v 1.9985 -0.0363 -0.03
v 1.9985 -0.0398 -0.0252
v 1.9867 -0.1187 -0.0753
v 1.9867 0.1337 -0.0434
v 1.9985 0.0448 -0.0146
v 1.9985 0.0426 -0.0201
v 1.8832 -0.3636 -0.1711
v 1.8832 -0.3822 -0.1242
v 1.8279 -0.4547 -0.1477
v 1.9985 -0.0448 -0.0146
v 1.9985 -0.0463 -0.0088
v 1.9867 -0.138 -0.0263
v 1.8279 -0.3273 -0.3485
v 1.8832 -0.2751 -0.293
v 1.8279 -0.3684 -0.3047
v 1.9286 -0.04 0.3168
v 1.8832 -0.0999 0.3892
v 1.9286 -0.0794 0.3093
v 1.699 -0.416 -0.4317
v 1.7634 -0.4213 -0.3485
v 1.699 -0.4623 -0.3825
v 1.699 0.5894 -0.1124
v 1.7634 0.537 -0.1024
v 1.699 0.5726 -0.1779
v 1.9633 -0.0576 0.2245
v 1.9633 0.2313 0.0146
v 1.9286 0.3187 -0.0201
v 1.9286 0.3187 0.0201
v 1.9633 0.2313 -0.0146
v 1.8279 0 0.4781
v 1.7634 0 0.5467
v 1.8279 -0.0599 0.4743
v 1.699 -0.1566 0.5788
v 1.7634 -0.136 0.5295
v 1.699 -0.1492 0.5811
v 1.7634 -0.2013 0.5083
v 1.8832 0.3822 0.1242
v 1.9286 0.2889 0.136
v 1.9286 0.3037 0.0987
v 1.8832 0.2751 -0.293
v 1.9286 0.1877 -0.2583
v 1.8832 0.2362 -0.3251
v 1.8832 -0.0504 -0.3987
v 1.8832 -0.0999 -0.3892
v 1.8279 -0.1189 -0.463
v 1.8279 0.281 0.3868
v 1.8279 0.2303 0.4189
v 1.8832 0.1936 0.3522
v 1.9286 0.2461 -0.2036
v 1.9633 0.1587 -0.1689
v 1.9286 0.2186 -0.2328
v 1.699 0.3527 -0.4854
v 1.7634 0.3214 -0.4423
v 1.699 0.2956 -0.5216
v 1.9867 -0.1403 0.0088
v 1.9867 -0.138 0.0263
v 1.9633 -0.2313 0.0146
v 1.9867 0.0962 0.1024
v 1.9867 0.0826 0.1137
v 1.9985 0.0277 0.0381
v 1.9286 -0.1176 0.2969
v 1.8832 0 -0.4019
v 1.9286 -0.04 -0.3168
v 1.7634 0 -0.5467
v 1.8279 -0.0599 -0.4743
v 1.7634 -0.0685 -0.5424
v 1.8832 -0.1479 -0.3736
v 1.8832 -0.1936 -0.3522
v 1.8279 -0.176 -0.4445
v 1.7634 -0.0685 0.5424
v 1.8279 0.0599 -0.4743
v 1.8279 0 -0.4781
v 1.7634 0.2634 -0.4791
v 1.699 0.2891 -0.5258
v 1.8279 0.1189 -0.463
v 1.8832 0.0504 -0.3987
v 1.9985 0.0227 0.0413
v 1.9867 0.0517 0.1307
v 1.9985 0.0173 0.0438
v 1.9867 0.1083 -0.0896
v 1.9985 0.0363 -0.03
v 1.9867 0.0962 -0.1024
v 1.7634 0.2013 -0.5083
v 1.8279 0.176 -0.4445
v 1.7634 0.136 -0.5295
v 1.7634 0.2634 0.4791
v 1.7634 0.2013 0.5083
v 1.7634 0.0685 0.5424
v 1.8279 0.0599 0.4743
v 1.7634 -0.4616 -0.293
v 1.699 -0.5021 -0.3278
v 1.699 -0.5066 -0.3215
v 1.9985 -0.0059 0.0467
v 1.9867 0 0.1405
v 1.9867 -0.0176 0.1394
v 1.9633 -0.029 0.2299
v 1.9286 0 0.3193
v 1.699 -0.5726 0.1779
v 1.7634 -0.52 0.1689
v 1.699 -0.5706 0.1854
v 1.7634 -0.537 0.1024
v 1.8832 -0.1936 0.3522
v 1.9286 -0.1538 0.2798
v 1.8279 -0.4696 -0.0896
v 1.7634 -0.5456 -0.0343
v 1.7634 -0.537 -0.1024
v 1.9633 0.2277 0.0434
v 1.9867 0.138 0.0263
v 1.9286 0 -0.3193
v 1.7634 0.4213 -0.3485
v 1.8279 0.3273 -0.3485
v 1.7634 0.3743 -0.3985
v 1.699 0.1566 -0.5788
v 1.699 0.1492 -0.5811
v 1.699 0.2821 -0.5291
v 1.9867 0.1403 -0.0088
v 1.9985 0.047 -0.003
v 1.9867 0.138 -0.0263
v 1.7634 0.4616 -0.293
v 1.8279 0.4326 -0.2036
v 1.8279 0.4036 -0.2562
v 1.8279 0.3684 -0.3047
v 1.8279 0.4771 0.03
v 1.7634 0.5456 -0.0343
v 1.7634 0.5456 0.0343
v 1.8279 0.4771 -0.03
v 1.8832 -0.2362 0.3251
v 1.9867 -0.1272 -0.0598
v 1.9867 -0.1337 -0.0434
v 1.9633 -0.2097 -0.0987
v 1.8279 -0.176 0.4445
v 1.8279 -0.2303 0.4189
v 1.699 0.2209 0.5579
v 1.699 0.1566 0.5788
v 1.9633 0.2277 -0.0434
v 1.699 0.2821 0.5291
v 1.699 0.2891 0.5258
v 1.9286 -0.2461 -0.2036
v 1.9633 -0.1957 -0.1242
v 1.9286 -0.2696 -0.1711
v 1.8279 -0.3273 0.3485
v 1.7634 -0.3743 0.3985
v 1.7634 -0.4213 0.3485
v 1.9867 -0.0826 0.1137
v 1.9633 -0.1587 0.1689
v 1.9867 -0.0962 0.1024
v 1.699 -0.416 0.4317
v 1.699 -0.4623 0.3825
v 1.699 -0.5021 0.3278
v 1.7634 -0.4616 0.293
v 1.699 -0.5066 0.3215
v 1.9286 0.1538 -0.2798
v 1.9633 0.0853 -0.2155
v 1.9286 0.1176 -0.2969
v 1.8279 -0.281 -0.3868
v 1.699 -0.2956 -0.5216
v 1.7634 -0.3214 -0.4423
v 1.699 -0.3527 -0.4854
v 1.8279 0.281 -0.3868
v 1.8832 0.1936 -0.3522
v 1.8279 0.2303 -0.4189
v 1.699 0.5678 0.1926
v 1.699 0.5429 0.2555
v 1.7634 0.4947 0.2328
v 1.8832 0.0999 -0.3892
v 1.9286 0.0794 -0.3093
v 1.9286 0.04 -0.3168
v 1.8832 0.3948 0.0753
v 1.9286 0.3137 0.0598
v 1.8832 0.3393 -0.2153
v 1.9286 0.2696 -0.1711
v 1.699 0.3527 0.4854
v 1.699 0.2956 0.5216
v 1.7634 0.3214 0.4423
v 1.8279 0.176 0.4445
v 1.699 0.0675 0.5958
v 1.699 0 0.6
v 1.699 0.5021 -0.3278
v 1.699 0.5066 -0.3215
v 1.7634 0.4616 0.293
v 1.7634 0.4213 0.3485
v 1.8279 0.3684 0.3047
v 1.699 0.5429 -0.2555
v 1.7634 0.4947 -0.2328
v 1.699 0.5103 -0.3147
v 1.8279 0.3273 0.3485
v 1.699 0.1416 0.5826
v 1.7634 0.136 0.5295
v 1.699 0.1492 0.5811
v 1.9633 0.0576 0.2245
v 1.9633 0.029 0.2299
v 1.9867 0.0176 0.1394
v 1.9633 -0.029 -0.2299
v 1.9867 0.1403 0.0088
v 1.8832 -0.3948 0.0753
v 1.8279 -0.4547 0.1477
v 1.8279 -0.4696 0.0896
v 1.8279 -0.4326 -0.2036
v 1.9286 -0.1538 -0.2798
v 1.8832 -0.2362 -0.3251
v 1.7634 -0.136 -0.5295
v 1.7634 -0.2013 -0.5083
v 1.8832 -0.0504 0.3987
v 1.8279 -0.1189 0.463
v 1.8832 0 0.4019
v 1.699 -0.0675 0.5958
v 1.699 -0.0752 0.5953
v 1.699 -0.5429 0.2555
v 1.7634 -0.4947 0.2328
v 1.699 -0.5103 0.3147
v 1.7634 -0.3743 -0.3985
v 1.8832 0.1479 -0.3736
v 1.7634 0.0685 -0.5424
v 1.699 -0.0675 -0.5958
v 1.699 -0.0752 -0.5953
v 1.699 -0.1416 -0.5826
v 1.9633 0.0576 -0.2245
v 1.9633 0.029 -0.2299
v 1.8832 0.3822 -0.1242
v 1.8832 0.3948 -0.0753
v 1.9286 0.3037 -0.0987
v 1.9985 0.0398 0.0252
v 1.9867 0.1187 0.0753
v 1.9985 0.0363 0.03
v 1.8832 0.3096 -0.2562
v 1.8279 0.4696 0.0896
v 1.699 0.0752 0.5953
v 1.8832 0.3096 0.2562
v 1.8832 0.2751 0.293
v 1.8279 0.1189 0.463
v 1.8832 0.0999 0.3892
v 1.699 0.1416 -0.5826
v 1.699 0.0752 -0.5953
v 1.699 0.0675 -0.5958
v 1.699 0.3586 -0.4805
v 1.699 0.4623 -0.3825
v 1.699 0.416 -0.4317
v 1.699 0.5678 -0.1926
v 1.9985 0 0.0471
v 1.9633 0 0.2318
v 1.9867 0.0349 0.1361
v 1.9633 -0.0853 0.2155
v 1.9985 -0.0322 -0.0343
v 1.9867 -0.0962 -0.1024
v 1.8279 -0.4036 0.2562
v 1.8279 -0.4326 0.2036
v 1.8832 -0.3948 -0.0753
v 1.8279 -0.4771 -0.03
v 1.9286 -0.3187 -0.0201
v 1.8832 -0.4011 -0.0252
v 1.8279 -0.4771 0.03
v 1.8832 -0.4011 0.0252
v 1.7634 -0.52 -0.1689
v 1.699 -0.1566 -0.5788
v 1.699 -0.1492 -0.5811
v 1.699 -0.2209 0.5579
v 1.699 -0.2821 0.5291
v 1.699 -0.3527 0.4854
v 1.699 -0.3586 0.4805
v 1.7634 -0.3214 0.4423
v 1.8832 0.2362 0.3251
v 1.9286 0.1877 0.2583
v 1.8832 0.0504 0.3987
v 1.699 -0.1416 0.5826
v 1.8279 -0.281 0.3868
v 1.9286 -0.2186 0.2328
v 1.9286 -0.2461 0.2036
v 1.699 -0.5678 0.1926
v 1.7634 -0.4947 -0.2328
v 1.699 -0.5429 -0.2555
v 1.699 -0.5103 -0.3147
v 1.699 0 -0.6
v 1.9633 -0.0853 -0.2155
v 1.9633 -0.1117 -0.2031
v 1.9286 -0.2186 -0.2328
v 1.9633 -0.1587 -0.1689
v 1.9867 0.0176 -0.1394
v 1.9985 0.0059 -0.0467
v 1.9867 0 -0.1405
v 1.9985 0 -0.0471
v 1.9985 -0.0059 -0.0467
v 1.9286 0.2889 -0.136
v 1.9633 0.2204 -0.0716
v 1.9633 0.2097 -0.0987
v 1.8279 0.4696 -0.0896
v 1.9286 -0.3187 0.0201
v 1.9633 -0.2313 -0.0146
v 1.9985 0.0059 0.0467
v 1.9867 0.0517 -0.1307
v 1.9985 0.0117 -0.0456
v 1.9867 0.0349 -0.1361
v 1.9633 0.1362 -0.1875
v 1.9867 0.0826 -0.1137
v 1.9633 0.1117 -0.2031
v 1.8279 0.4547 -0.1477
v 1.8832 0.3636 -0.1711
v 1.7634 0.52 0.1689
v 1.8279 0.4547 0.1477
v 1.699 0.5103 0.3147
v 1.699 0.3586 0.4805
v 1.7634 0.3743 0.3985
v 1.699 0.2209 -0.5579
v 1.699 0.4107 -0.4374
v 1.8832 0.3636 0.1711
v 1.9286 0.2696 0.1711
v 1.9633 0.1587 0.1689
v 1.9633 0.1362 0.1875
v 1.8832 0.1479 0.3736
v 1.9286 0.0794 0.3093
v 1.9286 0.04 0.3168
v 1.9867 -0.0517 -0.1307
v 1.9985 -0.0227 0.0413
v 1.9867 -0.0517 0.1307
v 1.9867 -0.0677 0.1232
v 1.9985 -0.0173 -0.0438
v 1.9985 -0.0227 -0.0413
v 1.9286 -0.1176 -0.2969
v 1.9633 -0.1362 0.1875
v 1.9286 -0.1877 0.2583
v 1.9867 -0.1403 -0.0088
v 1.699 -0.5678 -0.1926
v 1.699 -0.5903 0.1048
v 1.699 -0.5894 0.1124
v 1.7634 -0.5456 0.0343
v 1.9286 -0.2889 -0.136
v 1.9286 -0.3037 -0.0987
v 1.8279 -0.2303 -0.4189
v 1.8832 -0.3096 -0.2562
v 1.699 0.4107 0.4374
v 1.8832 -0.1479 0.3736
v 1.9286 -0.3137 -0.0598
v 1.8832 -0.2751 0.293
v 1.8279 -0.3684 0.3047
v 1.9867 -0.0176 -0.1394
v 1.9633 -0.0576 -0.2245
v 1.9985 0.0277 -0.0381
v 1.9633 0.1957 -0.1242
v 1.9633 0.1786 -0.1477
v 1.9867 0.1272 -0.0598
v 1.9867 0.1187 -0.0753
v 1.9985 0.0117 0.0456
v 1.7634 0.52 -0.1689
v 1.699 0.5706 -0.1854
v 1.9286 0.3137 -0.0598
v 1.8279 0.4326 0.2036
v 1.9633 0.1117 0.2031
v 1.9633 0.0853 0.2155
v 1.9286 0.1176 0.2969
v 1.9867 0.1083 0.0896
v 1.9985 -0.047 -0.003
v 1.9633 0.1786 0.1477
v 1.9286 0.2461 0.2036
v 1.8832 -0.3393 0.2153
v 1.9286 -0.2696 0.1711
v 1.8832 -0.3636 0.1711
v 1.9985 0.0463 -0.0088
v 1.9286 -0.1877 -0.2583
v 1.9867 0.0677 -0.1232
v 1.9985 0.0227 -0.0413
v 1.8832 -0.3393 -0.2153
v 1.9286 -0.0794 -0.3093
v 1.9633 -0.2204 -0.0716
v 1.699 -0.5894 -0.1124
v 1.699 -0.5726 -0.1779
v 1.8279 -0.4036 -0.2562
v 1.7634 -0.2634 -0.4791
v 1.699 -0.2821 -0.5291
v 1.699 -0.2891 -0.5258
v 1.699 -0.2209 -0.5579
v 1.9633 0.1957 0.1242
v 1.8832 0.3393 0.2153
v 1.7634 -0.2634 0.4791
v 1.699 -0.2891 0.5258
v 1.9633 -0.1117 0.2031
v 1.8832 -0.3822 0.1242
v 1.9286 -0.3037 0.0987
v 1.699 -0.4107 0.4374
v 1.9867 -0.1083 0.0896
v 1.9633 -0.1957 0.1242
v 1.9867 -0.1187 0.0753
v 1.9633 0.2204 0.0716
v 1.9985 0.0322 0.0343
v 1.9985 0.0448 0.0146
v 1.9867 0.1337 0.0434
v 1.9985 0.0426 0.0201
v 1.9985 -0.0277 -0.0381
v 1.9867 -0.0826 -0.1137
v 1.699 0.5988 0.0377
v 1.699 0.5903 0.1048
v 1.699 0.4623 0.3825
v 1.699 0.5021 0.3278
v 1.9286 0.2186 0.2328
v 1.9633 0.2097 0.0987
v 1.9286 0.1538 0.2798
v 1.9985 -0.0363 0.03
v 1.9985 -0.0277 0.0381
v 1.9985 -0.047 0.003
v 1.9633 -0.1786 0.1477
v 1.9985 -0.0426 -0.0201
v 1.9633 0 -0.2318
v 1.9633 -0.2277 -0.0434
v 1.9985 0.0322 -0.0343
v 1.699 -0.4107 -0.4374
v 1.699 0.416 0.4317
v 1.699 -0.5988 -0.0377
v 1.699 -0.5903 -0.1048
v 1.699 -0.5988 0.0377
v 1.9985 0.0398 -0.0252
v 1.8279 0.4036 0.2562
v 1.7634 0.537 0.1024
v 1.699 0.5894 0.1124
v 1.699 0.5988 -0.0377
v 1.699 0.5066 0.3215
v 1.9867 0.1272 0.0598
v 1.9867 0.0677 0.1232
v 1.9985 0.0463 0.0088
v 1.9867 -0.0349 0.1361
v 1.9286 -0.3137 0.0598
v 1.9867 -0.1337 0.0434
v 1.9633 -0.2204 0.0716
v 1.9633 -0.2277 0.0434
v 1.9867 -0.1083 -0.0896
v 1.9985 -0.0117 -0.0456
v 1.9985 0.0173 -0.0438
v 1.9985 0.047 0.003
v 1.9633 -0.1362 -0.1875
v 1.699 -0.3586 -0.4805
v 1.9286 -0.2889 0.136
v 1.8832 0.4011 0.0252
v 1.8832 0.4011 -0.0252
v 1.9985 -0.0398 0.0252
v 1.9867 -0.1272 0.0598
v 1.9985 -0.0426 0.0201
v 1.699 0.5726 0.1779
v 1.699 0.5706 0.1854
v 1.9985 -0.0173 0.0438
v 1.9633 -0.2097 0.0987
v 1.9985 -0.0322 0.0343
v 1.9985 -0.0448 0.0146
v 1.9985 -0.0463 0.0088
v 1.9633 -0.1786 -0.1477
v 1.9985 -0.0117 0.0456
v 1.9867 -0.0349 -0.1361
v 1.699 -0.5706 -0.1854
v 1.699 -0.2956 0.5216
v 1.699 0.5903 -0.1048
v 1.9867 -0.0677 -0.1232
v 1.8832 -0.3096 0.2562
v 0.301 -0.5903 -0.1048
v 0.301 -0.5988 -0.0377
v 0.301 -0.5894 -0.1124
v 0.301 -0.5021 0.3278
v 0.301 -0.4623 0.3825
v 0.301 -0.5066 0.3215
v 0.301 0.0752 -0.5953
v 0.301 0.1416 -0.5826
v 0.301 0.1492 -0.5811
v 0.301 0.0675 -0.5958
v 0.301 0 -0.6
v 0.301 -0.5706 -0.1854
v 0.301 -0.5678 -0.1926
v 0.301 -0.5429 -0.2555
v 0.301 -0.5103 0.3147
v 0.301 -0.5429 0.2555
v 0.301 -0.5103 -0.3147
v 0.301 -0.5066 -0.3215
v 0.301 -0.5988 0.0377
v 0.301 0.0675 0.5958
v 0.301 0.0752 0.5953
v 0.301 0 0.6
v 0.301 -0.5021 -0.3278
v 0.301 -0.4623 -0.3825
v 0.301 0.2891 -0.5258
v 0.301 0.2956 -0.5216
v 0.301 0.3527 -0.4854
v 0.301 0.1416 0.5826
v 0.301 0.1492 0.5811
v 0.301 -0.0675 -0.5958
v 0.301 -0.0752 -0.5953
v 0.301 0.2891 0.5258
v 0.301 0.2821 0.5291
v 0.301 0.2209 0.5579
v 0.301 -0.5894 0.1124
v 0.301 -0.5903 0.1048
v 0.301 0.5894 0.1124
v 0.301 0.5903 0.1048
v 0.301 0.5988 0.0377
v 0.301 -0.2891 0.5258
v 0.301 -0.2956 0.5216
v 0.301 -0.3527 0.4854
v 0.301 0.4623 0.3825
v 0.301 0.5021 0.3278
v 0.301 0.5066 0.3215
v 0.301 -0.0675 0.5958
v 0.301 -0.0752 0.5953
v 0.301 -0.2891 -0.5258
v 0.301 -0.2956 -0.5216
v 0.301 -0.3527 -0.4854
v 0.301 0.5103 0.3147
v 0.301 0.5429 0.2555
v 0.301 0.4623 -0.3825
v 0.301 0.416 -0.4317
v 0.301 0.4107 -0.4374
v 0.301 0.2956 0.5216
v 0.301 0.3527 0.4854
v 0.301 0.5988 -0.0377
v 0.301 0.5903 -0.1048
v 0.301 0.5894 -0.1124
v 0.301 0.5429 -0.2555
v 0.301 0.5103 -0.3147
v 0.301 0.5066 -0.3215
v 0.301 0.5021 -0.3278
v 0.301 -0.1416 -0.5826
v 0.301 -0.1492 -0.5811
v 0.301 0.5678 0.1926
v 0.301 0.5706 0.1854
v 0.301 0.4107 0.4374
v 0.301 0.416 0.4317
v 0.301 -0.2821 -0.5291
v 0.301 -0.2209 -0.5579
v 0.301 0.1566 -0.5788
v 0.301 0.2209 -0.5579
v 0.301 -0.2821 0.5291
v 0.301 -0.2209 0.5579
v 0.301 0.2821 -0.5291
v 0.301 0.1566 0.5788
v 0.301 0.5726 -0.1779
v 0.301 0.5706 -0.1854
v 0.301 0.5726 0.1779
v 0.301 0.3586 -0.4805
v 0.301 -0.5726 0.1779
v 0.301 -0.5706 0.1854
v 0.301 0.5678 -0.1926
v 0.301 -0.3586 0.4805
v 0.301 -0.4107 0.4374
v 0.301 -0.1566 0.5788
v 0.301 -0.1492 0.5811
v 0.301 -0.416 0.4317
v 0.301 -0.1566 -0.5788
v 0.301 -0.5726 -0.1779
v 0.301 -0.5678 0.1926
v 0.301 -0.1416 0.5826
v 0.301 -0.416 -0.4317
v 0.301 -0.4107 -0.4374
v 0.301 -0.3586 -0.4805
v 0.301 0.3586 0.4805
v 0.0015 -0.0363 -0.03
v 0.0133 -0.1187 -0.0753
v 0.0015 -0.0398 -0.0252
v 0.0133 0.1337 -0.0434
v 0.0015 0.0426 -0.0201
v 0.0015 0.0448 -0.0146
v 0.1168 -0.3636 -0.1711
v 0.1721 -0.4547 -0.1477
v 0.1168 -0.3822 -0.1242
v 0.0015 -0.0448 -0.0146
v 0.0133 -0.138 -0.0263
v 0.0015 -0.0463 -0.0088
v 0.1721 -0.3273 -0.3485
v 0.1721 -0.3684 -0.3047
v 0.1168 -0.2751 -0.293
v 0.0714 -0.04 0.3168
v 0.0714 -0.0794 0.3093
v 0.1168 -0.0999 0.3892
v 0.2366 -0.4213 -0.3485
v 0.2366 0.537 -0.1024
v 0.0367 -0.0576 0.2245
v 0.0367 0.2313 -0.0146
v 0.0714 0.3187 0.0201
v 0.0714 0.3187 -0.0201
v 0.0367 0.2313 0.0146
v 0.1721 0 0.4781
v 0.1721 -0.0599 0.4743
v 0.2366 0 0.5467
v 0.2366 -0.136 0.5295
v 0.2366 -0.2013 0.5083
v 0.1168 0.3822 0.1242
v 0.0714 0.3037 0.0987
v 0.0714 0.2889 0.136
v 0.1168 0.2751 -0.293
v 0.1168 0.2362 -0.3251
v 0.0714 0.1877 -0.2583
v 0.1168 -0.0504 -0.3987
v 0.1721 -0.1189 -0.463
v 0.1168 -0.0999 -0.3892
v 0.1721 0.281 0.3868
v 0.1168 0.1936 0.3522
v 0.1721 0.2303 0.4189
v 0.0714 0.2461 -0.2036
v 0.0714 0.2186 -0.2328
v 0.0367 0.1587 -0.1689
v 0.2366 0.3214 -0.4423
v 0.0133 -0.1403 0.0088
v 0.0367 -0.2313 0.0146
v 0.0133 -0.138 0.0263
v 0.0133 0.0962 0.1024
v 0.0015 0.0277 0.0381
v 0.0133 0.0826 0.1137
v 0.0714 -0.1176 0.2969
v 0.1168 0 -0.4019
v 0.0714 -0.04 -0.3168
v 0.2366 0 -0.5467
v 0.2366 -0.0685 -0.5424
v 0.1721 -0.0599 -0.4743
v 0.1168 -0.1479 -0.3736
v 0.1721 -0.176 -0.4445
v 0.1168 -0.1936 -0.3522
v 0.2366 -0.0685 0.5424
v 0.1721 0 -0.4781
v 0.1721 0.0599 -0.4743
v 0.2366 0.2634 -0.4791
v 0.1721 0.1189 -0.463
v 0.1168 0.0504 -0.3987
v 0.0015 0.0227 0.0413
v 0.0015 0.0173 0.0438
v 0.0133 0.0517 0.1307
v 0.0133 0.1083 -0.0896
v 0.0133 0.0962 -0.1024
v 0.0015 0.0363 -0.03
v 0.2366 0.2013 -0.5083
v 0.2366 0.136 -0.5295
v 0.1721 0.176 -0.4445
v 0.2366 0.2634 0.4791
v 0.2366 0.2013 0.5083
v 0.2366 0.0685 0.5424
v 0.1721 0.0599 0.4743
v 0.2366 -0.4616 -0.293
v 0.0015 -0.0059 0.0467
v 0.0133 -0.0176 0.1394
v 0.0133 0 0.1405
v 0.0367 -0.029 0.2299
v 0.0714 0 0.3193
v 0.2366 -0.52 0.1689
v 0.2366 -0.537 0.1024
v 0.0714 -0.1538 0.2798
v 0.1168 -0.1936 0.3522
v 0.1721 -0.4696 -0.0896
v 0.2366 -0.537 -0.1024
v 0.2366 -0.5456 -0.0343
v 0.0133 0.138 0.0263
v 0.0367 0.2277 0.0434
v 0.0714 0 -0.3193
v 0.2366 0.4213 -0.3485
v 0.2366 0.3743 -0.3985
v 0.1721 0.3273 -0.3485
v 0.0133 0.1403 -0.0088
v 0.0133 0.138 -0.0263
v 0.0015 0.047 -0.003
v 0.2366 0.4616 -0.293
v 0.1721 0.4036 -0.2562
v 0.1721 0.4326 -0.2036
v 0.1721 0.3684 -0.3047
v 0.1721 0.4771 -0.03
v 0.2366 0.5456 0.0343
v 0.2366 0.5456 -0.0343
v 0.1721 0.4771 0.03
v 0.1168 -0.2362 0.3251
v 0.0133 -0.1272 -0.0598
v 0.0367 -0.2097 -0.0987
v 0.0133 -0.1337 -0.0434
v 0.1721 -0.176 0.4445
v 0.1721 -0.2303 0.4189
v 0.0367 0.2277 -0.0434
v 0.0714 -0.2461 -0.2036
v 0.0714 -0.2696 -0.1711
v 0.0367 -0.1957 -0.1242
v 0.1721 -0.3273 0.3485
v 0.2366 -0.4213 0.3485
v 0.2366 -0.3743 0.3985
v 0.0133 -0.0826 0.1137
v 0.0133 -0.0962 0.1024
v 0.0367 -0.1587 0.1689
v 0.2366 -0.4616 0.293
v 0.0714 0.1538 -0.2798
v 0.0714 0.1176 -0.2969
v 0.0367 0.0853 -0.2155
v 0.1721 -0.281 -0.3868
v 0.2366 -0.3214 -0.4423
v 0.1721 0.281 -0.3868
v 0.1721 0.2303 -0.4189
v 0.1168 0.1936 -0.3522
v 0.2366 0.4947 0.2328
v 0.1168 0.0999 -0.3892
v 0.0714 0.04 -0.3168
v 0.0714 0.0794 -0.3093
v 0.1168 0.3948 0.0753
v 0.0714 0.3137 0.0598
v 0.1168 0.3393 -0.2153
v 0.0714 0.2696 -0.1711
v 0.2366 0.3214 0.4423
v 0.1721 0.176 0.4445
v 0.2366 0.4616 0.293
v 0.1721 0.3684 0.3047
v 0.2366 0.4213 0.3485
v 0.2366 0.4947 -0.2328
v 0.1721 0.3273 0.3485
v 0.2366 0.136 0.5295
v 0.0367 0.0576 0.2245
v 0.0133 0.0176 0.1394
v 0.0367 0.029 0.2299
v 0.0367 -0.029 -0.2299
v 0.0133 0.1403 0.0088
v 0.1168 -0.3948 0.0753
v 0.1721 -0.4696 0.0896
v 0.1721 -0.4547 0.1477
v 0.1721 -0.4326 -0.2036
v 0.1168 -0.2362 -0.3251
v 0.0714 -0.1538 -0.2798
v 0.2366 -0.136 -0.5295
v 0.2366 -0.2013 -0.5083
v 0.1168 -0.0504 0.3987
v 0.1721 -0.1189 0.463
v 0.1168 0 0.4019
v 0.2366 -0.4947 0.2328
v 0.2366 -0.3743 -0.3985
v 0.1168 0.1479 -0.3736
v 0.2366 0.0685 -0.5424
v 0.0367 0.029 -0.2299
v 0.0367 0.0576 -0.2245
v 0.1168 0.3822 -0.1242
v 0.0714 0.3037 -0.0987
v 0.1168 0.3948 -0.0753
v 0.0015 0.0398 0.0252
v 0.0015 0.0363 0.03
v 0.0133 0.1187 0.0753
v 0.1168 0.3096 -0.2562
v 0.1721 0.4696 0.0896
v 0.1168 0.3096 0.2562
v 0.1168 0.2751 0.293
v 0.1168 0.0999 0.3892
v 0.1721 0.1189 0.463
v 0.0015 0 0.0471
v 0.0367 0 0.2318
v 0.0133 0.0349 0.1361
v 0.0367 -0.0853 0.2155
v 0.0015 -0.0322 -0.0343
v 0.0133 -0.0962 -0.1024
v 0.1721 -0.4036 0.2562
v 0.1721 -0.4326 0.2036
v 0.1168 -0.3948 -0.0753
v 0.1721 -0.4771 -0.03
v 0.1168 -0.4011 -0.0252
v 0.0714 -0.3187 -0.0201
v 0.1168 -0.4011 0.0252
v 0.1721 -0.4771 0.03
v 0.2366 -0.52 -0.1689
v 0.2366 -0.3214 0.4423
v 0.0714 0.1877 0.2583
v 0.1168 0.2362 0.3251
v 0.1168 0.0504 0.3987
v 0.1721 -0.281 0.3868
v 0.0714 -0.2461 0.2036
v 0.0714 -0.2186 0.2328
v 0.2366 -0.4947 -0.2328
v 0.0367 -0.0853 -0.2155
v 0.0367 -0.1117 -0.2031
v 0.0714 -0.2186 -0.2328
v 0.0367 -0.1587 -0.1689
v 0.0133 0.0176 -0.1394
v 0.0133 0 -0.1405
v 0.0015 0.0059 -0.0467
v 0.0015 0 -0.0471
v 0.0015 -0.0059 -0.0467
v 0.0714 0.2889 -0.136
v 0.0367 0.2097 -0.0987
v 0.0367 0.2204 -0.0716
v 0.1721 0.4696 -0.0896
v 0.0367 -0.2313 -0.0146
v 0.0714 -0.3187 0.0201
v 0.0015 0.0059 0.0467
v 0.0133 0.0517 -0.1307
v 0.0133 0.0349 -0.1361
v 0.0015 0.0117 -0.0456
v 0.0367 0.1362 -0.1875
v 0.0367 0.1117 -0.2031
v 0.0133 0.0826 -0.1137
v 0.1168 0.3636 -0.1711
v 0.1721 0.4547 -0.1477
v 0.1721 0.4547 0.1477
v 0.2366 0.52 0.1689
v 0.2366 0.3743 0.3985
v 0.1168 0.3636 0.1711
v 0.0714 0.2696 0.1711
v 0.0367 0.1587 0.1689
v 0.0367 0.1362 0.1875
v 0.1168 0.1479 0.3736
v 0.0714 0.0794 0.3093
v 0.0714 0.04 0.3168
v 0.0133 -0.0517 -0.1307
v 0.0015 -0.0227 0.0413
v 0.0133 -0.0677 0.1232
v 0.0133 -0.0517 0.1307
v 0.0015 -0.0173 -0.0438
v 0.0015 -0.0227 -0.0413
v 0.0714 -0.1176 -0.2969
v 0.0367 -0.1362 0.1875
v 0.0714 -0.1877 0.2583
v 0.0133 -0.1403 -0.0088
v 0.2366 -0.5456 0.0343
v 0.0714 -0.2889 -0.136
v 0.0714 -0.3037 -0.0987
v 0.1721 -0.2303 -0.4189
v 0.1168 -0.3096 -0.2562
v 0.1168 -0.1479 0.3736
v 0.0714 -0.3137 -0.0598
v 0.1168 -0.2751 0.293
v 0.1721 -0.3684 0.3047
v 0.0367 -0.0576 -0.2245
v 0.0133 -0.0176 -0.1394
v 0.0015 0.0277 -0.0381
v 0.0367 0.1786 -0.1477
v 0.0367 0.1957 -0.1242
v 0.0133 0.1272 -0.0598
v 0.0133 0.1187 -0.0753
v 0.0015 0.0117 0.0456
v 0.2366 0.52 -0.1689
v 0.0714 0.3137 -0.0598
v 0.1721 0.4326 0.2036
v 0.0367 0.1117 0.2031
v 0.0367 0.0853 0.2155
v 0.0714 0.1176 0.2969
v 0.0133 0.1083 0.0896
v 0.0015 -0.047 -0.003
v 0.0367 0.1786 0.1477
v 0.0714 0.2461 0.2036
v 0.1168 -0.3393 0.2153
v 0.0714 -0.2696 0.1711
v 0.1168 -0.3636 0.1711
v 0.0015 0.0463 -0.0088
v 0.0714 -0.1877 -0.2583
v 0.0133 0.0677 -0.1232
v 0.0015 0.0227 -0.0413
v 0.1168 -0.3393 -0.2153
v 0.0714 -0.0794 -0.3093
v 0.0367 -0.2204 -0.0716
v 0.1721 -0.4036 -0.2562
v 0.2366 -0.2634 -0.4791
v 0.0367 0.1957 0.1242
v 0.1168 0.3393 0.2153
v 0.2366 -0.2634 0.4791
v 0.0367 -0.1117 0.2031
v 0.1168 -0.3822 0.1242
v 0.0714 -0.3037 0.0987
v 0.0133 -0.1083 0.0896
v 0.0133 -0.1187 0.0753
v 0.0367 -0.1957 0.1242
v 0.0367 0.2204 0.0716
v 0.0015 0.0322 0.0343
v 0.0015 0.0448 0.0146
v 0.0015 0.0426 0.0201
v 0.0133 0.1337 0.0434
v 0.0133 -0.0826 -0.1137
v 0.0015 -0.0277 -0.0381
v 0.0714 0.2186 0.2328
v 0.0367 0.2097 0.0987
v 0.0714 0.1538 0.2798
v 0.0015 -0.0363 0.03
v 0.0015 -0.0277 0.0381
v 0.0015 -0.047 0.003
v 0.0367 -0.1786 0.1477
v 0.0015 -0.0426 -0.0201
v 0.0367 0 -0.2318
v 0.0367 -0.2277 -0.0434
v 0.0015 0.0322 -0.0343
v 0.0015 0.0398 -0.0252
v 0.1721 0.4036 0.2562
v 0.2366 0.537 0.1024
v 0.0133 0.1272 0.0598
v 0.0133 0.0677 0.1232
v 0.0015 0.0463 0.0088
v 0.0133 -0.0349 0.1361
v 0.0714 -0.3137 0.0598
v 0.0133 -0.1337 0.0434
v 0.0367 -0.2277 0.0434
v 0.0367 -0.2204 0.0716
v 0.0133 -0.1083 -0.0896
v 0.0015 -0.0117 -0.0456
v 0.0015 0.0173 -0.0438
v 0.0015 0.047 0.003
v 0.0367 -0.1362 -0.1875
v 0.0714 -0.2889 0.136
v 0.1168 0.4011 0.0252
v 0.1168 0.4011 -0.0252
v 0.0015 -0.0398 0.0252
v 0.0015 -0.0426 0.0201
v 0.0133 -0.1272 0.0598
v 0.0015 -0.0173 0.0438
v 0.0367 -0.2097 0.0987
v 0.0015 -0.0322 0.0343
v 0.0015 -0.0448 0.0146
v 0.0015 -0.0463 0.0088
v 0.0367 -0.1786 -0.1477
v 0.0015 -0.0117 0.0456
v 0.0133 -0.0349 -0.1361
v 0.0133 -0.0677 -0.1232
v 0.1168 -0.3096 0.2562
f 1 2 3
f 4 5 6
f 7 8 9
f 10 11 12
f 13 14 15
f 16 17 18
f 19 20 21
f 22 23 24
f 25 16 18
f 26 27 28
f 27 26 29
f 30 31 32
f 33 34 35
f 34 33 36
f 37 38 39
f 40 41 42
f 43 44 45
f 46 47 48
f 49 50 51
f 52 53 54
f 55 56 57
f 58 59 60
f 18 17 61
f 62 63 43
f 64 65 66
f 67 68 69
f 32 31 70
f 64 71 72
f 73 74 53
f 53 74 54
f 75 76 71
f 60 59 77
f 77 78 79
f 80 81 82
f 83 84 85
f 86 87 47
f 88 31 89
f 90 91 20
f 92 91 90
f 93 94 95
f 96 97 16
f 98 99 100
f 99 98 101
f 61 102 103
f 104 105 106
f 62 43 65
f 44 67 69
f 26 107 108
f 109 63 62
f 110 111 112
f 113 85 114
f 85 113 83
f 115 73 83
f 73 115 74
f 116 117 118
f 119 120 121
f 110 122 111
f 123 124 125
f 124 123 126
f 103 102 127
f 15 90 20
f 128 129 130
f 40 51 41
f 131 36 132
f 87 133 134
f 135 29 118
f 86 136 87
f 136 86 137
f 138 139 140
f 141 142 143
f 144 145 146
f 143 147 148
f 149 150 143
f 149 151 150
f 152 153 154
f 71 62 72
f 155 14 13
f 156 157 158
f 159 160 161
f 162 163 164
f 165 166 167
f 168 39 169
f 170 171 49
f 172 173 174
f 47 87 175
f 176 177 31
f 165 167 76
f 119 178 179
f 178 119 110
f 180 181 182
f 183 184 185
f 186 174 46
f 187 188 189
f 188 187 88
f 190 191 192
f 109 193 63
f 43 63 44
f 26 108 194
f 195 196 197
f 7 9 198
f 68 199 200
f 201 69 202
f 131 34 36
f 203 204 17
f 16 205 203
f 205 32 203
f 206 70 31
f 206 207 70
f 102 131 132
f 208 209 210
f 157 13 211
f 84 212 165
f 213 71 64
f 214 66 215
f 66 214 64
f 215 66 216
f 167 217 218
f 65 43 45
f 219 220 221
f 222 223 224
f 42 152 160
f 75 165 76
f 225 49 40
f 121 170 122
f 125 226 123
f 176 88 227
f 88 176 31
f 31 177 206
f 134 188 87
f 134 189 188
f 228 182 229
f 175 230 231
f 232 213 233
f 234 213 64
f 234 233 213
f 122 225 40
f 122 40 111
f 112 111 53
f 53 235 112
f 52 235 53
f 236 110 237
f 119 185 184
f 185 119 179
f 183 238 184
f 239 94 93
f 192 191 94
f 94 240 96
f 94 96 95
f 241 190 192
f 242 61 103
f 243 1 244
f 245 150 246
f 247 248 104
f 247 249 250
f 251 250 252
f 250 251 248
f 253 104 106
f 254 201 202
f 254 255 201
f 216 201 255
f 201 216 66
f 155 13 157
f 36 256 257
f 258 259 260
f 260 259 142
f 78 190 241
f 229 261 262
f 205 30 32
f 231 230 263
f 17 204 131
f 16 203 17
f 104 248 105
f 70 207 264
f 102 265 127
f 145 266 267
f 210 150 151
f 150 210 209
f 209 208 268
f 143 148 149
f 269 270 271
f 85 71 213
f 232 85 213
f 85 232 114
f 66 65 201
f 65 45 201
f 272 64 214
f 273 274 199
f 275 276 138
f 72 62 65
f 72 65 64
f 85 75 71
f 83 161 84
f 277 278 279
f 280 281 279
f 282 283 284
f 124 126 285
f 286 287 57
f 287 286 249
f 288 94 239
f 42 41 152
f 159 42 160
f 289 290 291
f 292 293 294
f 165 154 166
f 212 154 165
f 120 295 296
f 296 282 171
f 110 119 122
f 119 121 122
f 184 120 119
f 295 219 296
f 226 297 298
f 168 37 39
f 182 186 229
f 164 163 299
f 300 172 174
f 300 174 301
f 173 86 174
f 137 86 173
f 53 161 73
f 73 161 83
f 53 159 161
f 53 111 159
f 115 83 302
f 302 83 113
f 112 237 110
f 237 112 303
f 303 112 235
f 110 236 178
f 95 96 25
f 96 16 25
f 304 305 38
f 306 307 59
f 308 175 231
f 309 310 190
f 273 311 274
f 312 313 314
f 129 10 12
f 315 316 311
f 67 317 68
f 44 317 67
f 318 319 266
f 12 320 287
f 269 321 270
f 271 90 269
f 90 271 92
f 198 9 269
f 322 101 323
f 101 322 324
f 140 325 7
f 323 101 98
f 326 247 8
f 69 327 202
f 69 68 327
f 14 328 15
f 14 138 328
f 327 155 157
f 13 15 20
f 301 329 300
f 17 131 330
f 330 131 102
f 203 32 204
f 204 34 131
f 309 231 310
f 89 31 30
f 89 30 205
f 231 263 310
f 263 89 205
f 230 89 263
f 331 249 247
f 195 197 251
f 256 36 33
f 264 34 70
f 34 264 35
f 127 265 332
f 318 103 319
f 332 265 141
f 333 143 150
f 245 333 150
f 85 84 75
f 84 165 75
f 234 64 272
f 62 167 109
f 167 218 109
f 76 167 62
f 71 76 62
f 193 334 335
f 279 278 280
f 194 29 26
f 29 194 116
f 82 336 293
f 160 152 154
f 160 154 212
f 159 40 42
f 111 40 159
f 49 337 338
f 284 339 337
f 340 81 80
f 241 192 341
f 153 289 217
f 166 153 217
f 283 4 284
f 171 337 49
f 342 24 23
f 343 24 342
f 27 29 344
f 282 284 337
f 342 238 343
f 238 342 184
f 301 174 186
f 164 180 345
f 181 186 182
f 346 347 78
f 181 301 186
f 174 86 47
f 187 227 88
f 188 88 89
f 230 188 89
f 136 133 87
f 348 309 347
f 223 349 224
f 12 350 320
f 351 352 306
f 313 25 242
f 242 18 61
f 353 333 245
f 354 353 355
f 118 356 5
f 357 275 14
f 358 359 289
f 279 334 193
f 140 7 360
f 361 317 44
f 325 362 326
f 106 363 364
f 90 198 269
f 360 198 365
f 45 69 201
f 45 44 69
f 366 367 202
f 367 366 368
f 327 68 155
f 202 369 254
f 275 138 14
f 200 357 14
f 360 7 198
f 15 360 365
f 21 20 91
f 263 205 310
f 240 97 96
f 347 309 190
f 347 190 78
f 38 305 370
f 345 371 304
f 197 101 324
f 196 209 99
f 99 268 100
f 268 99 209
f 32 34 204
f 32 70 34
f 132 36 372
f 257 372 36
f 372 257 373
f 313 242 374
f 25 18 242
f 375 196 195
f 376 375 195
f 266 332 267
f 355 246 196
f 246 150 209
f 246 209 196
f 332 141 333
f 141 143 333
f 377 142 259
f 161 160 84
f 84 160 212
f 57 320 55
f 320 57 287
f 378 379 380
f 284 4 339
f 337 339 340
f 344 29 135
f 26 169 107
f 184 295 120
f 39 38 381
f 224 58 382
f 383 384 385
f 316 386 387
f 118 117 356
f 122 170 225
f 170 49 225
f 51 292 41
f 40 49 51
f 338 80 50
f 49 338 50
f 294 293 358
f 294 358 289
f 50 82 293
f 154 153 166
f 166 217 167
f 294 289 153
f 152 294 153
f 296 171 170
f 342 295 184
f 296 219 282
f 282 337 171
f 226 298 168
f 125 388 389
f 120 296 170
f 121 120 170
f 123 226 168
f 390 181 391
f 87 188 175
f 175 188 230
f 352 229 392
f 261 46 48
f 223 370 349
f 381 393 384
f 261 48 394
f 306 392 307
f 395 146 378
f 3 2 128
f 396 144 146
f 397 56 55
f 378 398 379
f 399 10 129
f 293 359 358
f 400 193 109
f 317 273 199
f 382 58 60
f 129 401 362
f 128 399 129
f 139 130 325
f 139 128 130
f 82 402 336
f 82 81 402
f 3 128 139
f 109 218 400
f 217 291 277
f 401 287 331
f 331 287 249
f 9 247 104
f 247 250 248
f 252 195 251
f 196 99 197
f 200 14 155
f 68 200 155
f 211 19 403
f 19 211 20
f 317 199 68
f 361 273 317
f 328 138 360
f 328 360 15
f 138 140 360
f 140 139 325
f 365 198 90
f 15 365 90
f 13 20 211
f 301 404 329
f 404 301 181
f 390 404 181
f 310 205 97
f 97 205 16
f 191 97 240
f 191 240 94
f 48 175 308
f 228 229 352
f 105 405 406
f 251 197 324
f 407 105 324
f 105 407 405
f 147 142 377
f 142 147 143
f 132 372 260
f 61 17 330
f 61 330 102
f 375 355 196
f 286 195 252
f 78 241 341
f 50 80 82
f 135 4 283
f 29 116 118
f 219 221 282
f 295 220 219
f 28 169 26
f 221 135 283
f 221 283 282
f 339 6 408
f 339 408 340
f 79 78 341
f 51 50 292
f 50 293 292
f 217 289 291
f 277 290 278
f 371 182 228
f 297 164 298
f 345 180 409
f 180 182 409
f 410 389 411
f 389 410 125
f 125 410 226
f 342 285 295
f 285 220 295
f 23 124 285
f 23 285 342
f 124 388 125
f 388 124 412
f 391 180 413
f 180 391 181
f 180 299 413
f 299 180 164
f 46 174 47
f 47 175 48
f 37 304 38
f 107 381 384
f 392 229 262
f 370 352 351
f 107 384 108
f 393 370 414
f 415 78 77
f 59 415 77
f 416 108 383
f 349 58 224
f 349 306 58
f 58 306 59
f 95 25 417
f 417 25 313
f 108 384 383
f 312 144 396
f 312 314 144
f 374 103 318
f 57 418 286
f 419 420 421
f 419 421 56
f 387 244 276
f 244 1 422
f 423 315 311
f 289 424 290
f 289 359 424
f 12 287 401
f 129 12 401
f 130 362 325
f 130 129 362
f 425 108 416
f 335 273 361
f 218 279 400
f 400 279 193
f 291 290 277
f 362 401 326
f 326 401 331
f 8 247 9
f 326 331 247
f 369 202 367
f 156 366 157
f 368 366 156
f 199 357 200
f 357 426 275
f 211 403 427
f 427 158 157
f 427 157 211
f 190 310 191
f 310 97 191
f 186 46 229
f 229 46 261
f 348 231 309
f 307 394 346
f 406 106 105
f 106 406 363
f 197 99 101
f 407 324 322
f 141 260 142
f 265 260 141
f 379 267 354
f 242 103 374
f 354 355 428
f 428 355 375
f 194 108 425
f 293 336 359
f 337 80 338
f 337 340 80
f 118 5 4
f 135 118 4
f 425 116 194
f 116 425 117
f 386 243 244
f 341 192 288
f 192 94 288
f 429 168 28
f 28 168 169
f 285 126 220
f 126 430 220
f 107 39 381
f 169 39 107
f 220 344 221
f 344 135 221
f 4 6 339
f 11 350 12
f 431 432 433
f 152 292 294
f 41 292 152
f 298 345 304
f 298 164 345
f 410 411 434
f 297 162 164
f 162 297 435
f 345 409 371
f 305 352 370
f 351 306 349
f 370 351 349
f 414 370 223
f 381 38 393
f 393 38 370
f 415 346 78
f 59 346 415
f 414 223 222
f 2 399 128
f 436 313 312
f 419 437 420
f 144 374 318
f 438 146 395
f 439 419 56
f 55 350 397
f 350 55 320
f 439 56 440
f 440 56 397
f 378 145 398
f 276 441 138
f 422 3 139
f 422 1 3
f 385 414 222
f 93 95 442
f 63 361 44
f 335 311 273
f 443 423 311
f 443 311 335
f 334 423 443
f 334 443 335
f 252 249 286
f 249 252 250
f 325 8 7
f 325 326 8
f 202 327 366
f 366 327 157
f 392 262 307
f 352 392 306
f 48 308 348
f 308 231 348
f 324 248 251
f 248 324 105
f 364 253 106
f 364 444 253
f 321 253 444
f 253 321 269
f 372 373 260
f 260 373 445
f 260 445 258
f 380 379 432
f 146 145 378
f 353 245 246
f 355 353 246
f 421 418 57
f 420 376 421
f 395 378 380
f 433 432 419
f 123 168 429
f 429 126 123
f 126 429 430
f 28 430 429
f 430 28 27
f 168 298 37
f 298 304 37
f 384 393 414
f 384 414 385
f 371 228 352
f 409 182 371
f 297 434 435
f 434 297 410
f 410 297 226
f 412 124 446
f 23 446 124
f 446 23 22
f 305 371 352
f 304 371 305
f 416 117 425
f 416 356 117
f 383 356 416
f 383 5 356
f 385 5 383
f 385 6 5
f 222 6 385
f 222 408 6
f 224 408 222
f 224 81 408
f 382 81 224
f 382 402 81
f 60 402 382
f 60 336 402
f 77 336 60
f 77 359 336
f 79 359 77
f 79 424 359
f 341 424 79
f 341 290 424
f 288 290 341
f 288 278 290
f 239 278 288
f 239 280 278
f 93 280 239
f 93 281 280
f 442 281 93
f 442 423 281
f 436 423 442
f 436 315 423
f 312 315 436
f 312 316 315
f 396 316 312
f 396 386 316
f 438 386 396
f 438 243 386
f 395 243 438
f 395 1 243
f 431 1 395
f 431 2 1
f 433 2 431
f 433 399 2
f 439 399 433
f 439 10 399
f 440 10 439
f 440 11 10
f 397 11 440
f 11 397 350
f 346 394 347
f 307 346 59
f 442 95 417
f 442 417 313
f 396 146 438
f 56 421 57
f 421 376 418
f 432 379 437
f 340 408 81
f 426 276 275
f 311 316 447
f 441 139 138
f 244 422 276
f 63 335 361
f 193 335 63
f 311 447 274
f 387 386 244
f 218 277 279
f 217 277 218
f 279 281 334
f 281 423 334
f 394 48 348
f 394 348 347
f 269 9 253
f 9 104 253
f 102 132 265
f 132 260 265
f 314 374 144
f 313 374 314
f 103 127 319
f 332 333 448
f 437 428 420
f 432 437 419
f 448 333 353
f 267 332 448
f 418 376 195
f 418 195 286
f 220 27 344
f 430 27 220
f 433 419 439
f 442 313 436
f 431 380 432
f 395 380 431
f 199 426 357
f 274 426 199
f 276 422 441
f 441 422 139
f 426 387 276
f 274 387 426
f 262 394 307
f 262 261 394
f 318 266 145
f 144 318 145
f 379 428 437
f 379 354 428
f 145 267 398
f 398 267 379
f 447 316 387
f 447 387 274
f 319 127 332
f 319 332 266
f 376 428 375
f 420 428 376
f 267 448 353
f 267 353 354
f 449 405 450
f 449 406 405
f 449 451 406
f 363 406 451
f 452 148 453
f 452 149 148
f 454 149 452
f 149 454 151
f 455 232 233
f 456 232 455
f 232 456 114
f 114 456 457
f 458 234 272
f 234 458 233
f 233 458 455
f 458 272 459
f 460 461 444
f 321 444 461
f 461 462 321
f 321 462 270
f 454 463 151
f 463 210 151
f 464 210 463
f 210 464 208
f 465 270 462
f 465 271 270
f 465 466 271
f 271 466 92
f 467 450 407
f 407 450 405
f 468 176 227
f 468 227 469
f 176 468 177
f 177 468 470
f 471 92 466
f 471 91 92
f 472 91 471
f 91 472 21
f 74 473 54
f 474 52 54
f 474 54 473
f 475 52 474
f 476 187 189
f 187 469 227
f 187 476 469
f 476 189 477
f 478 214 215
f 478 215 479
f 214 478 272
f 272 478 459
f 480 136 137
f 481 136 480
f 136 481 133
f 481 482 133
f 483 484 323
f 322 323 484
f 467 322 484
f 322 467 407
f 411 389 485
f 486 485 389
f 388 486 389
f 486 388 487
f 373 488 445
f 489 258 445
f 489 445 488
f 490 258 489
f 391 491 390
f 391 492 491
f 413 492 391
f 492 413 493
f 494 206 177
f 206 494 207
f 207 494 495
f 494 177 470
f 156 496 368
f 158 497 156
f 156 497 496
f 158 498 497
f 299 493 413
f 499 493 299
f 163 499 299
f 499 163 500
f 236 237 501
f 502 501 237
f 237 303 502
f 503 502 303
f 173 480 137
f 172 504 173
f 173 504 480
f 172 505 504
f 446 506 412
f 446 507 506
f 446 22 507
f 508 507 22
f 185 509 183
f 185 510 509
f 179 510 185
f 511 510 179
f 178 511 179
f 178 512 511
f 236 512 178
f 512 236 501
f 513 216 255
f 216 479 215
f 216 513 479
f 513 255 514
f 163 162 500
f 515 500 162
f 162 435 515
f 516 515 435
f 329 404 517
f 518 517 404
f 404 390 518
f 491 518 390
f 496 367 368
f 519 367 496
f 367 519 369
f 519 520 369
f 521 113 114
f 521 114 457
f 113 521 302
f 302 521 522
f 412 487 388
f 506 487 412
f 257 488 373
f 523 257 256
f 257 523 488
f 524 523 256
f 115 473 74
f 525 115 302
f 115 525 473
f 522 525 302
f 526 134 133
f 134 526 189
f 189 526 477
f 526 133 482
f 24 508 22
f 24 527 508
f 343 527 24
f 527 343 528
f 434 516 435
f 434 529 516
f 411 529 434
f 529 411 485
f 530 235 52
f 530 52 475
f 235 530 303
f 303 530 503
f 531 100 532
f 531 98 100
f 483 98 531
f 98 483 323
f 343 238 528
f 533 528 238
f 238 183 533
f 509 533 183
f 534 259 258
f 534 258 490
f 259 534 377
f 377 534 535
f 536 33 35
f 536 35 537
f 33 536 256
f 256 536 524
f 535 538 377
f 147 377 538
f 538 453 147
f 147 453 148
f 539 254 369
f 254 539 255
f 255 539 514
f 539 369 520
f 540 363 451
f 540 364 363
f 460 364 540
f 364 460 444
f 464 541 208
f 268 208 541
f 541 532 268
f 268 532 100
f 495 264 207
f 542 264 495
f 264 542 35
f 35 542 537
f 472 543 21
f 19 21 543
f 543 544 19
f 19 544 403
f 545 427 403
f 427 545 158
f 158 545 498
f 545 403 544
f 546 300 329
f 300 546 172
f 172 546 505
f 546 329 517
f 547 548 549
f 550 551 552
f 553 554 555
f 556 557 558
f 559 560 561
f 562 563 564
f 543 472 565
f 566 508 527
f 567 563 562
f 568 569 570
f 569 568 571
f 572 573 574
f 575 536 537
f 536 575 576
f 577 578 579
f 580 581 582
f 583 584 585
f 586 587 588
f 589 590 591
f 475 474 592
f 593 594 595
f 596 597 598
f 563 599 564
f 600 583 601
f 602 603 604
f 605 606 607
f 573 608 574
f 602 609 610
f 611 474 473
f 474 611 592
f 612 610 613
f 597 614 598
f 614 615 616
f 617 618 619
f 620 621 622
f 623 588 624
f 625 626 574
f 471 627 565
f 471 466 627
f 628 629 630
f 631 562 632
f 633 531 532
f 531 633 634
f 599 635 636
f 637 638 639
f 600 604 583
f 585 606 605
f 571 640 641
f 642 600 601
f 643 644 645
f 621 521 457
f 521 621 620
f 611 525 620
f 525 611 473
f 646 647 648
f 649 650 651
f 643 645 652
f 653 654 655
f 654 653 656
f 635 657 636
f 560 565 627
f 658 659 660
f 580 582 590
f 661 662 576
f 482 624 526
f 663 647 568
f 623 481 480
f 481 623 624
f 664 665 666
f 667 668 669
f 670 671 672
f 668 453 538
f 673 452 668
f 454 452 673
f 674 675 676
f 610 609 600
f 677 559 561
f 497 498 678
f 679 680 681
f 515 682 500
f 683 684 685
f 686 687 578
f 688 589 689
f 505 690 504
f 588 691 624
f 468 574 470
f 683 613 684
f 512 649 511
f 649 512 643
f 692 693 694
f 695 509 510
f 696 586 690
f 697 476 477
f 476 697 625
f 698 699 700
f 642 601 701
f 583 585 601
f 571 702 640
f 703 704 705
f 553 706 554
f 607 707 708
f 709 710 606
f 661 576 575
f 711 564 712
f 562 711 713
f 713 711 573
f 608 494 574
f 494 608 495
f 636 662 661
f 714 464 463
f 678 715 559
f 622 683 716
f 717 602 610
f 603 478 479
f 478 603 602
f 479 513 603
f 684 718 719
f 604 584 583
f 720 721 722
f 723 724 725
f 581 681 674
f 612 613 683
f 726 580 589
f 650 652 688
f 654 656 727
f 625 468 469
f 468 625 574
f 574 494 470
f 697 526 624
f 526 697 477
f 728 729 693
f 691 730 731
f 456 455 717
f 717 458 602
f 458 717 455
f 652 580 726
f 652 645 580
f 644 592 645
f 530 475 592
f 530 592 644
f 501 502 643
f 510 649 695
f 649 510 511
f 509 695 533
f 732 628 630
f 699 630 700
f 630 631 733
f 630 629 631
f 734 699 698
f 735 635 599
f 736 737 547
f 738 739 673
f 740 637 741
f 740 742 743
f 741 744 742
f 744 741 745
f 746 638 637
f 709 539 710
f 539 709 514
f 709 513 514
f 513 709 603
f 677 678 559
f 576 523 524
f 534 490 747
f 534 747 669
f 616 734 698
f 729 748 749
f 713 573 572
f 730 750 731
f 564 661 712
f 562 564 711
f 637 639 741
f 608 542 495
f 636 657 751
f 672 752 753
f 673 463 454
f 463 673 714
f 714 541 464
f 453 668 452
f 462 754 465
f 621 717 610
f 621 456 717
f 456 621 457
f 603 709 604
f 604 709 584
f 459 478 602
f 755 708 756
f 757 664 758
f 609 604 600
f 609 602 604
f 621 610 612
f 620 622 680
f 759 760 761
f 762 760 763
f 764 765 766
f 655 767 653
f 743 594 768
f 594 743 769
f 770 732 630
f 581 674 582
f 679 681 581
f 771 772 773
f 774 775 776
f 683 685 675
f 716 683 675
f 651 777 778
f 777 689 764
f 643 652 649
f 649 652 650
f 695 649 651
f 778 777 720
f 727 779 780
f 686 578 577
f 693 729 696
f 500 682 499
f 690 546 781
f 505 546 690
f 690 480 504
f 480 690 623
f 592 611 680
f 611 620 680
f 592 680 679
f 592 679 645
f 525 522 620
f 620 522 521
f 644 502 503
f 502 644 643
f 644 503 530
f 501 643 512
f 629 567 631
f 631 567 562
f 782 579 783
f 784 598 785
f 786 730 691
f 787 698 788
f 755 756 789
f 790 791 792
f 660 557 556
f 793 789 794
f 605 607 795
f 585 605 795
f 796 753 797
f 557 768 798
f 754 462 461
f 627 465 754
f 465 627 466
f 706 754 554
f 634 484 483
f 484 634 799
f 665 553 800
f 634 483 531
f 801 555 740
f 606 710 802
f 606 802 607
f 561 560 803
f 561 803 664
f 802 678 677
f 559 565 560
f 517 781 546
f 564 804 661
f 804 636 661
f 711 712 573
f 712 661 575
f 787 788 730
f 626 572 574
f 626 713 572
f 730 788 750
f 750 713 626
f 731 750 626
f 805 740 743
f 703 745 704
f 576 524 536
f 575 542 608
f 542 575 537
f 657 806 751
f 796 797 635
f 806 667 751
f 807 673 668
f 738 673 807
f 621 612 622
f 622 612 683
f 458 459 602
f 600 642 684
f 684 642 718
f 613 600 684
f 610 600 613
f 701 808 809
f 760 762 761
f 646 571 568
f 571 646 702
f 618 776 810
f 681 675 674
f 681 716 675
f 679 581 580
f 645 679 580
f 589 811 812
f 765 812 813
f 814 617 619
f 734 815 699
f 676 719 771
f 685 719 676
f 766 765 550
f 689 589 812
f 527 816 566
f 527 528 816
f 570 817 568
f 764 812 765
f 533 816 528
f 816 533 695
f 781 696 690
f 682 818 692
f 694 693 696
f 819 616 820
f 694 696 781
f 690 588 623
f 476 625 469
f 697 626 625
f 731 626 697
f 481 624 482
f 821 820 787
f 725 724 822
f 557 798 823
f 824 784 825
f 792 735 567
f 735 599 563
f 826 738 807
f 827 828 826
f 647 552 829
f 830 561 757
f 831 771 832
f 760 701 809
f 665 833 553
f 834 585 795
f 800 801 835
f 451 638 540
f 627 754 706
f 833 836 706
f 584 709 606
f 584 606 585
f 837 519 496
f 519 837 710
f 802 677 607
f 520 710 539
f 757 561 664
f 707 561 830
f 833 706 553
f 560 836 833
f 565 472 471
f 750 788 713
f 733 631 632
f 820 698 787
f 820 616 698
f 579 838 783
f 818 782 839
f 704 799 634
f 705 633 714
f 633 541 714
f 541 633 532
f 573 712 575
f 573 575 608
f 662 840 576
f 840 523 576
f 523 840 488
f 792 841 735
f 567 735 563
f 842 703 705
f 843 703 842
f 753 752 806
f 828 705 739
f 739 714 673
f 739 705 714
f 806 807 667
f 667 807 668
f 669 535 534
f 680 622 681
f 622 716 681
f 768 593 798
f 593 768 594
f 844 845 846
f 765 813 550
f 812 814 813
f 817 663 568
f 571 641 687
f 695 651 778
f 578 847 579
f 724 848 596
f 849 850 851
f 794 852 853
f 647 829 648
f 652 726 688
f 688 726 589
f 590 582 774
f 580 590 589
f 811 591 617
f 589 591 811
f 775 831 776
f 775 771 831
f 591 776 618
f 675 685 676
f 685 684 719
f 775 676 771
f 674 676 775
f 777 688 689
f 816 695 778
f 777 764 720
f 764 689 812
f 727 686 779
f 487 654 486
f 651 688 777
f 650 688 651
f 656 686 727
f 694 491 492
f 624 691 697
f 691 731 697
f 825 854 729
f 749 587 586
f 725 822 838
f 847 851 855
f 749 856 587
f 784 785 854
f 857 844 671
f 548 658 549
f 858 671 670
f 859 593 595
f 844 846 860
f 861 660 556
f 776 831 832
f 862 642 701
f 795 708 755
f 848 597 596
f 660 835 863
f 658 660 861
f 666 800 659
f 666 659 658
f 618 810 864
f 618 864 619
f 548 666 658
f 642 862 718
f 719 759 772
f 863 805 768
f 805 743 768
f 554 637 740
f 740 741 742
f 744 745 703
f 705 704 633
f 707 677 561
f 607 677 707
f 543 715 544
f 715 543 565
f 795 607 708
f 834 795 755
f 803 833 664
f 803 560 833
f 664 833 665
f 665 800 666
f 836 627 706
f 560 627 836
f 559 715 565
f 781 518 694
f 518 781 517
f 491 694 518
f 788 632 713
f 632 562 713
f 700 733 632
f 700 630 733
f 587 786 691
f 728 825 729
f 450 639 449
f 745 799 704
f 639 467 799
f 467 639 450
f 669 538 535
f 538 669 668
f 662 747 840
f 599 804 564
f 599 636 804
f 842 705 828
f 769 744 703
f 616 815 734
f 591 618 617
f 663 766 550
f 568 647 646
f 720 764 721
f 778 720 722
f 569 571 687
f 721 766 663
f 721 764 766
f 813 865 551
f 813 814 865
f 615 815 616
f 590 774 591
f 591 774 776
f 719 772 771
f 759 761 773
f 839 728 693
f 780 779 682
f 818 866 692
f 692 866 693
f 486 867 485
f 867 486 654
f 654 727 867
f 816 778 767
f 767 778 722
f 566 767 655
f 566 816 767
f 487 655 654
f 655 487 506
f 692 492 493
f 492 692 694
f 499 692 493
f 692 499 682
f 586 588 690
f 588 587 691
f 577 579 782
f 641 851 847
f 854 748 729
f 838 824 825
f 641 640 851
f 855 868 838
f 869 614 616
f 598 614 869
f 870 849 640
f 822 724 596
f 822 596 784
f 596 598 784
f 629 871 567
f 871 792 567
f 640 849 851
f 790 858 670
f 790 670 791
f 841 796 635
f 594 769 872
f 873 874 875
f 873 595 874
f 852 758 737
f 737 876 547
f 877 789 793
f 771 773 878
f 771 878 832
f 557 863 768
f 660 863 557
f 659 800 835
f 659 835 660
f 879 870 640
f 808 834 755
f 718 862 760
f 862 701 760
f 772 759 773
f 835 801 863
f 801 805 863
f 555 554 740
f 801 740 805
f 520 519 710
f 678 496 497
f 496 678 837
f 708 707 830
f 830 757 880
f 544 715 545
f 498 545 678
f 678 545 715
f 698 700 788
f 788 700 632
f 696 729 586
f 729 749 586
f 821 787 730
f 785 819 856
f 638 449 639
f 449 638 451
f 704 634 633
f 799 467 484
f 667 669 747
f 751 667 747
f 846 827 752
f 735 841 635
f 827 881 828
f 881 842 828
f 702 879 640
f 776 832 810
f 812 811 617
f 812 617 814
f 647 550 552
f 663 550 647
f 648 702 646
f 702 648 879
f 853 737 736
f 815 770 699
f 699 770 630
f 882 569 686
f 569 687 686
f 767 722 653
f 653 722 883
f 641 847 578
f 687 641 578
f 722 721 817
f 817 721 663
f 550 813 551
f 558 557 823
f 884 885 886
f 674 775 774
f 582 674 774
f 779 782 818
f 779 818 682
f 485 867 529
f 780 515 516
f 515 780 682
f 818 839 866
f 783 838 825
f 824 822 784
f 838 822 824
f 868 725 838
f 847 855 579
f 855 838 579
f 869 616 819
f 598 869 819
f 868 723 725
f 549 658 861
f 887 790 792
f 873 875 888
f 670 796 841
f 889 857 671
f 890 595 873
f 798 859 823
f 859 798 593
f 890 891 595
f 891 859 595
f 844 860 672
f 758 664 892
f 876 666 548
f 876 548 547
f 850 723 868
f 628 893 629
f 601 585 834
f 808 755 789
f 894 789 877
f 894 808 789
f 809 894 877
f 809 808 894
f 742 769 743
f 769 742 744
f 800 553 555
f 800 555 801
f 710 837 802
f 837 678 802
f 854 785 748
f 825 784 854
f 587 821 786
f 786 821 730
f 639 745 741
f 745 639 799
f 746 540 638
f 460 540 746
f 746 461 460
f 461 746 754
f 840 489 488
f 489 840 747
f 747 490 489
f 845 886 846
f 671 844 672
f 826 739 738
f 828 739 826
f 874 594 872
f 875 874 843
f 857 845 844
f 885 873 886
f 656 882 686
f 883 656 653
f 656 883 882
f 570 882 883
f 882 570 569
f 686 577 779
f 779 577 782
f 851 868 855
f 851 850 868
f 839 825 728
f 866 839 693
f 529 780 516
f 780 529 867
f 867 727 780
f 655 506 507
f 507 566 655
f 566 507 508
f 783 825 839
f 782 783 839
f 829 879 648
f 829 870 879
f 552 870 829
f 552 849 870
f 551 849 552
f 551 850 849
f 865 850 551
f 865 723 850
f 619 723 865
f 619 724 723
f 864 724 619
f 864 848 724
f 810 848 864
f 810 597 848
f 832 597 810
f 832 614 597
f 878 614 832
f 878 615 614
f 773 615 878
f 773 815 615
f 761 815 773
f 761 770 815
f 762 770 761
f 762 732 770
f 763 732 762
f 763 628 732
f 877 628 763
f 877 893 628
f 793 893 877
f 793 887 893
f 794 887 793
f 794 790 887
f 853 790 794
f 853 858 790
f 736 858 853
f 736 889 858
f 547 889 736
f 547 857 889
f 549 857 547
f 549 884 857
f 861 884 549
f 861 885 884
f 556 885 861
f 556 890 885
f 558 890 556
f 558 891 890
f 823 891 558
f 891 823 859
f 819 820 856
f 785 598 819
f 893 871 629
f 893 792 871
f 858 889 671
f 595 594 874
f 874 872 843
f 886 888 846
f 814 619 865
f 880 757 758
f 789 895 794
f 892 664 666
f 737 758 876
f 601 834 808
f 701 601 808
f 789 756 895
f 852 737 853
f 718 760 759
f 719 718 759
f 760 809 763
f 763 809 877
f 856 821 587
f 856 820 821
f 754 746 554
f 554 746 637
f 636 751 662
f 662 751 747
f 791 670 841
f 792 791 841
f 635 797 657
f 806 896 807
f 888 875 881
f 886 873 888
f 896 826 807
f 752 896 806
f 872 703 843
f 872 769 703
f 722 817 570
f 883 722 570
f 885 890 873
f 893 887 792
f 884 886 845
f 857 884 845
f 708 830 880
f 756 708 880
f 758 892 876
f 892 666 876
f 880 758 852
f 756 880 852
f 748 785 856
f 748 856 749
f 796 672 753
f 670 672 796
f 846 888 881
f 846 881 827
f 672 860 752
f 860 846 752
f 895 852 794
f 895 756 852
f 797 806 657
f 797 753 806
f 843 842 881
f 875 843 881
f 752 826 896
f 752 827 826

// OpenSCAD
$fn=50;  // REMOVE
DO = 1.2; // REMOVE
PARAM1 = 0.75; // REMOVE
LENGTH = 2.0; // REMOVE
rotate([0,90,0])
translate([0,0,(LENGTH)/2])
union()
{
    union()
    {
        intersection()
        {
            translate([0,0,(LENGTH)/2]) translate([0,0,-(PARAM1)]) sphere(r=(PARAM1));
            cylinder(h = (LENGTH)/2, r = (DO)/2);
        }
        cylinder(h = (LENGTH)/2-(PARAM1), r=(DO)/2);
    }
    mirror([0,0,1])
    union()
    {
        intersection()
        {
            translate([0,0,(LENGTH)/2]) translate([0,0,-(PARAM1)]) sphere(r=(PARAM1));
            cylinder(h = (LENGTH)/2, r = (DO)/2);
        }
        cylinder(h = (LENGTH)/2-(PARAM1), r=(DO)/2);
    }
}
